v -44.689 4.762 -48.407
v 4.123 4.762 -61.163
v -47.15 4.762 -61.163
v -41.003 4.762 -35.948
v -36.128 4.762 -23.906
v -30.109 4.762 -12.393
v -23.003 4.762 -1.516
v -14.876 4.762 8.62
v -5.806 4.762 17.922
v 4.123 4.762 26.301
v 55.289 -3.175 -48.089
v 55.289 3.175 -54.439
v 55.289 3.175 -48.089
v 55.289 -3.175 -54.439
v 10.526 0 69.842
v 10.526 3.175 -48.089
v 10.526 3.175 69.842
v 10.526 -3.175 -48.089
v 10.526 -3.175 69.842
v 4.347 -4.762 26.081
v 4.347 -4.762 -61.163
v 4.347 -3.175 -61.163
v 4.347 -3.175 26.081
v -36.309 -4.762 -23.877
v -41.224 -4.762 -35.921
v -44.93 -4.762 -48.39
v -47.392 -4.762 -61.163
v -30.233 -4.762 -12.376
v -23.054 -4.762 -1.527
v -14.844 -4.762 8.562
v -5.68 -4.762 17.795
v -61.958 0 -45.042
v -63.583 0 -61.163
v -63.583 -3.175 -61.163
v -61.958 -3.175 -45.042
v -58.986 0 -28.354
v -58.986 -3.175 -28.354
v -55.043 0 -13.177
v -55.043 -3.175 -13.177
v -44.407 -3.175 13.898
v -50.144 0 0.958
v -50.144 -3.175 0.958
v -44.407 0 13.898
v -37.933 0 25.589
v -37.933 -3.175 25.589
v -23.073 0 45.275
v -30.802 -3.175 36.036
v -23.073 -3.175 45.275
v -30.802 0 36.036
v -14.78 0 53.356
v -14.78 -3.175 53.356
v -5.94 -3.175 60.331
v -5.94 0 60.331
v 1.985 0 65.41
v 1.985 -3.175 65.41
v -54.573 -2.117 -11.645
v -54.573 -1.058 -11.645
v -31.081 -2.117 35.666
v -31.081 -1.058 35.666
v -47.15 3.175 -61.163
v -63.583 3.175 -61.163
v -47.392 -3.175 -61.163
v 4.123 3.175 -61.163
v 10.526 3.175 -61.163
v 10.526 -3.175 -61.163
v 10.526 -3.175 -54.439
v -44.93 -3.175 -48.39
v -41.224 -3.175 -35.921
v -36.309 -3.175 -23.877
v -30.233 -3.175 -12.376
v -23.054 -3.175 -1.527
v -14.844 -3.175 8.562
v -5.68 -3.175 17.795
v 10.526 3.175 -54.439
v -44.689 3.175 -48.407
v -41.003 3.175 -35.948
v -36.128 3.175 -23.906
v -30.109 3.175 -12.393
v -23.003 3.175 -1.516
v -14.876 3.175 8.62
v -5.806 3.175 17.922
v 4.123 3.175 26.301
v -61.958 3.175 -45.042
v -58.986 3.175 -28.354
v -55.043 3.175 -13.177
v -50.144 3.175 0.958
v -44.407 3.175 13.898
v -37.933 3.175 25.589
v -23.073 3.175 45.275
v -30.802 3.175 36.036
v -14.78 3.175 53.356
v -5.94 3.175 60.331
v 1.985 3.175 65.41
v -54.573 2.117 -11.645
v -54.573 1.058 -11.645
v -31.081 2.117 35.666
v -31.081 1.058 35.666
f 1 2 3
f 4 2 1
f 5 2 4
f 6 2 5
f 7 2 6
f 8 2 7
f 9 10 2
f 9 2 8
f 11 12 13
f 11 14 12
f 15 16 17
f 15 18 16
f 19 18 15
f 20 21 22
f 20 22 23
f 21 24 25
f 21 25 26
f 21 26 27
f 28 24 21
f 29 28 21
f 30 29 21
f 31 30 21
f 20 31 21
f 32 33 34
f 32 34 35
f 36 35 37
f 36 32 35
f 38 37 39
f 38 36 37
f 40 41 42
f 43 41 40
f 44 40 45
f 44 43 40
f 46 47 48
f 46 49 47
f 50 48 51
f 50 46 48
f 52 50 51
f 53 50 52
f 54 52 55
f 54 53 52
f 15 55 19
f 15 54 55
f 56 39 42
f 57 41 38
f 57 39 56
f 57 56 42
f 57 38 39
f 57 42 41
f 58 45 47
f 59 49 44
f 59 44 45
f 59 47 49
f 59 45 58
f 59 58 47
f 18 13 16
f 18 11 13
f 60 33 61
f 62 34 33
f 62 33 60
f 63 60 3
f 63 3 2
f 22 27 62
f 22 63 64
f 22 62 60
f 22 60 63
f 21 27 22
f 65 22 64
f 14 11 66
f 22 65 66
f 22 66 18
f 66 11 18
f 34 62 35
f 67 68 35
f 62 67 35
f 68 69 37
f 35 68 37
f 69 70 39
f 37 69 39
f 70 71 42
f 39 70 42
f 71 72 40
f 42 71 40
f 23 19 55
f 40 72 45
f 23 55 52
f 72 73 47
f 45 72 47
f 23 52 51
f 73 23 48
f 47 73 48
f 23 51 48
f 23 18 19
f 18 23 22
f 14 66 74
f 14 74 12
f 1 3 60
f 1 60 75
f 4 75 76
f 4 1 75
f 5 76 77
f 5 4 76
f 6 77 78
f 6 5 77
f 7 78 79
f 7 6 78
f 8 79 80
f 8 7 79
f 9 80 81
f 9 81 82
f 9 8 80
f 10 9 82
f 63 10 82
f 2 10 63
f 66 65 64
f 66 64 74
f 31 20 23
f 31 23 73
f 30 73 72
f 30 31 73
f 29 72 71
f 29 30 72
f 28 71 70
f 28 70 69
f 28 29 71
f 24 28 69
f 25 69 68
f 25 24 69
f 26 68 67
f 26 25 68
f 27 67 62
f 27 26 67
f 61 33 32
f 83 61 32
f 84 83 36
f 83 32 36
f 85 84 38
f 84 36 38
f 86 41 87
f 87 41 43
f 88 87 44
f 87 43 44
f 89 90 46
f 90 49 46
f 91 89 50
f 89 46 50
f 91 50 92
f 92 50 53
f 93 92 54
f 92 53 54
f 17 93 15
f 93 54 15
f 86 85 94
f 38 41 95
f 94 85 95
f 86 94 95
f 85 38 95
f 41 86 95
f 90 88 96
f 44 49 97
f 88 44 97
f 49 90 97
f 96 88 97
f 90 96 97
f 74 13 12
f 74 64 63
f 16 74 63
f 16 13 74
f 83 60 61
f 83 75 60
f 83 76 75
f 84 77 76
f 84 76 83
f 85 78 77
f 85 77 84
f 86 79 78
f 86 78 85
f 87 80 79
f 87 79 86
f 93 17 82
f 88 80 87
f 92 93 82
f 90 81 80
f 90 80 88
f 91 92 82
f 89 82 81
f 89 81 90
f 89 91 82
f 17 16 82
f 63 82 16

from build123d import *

# Parameters (mm, degrees)
F0_W     = 3.9206347639
F0_H     = 6.35
F0_W_2   = 38.6172633823
F0_W_3   = 6.145446312
F1_DEPTH = 3.175
F3_DEPTH = 1.5875
F5_DEPTH = 1.5875


with BuildPart() as f1:
    # F0 (on Front) → F1 (new body, symmetric)
    with BuildSketch(Plane.XZ):
        with BuildLine():
            add(Edge.make_bspline(
                [(-63.5830785449, -61.1632146377), (-60.6032821452, -14.1837314043), (-41.3495043683, 45.8758918628), (10.5261552874, 69.8420151656)],
                knots=[0, 0, 0, 0, 150.514280967, 150.514280967, 150.514280967, 150.514280967], degree=3))
            Line((-63.5830785449, -61.1632146377), (10.5261552874, -61.1632146377))
            Line((10.5261552874, -61.1632146377), (10.5261552874, -54.4388230847))
            Line((10.5261552874, -54.4388230847), (6.6055205235, -54.4388230847))
            Line((6.6055205235, -54.4388230847), (6.6055205235, -48.0888230847))
            Line((6.6055205235, -48.0888230847), (10.5261552874, -48.0888230847))
            Line((10.5261552874, -48.0888230847), (10.5261552874, 69.8420151656))
        make_face()
        with Locations((8.5658379055, -51.2638230847)):
            Rectangle(F0_W, F0_H)
        with Locations((29.8347869785, -51.2638230847)):
            Rectangle(F0_W_2, F0_H)
        with Locations((52.2161418257, -51.2638230847)):
            Rectangle(F0_W_3, F0_H)
    extrude(amount=F1_DEPTH, both=True)

    # F2 (on face) → F3 (join, symmetric)
    with BuildSketch(Plane(origin=(0, 3.175, 0), x_dir=(-1, 0, 0), z_dir=(0, 1, 0))):
        with BuildLine():
            Line((-4.1227932088, 26.3006426394), (-4.1227932088, -61.1632146377))
            Line((-4.1227932088, -61.1632146377), (47.1498034894, -61.1632146377))
            ThreePointArc((47.1498034894, -61.1632146377), (30.1089207689, -12.3925272169), (-4.1227932088, 26.3006426394))
        make_face()
    extrude(amount=F3_DEPTH, both=True)

    # F4 (on face) → F5 (join, symmetric)
    with BuildSketch(Plane.XZ.offset(3.175)):
        with BuildLine():
            Line((-47.3917610943, -61.1632146377), (4.3468987569, -61.1632146377))
            Line((4.3468987569, -61.1632146377), (4.3468987569, 26.0813757777))
            ThreePointArc((4.3468987569, 26.0813757777), (-30.2325786117, -12.3755406522), (-47.3917610943, -61.1632146377))
        make_face()
    extrude(amount=F5_DEPTH, both=True)


solid = f1.part
